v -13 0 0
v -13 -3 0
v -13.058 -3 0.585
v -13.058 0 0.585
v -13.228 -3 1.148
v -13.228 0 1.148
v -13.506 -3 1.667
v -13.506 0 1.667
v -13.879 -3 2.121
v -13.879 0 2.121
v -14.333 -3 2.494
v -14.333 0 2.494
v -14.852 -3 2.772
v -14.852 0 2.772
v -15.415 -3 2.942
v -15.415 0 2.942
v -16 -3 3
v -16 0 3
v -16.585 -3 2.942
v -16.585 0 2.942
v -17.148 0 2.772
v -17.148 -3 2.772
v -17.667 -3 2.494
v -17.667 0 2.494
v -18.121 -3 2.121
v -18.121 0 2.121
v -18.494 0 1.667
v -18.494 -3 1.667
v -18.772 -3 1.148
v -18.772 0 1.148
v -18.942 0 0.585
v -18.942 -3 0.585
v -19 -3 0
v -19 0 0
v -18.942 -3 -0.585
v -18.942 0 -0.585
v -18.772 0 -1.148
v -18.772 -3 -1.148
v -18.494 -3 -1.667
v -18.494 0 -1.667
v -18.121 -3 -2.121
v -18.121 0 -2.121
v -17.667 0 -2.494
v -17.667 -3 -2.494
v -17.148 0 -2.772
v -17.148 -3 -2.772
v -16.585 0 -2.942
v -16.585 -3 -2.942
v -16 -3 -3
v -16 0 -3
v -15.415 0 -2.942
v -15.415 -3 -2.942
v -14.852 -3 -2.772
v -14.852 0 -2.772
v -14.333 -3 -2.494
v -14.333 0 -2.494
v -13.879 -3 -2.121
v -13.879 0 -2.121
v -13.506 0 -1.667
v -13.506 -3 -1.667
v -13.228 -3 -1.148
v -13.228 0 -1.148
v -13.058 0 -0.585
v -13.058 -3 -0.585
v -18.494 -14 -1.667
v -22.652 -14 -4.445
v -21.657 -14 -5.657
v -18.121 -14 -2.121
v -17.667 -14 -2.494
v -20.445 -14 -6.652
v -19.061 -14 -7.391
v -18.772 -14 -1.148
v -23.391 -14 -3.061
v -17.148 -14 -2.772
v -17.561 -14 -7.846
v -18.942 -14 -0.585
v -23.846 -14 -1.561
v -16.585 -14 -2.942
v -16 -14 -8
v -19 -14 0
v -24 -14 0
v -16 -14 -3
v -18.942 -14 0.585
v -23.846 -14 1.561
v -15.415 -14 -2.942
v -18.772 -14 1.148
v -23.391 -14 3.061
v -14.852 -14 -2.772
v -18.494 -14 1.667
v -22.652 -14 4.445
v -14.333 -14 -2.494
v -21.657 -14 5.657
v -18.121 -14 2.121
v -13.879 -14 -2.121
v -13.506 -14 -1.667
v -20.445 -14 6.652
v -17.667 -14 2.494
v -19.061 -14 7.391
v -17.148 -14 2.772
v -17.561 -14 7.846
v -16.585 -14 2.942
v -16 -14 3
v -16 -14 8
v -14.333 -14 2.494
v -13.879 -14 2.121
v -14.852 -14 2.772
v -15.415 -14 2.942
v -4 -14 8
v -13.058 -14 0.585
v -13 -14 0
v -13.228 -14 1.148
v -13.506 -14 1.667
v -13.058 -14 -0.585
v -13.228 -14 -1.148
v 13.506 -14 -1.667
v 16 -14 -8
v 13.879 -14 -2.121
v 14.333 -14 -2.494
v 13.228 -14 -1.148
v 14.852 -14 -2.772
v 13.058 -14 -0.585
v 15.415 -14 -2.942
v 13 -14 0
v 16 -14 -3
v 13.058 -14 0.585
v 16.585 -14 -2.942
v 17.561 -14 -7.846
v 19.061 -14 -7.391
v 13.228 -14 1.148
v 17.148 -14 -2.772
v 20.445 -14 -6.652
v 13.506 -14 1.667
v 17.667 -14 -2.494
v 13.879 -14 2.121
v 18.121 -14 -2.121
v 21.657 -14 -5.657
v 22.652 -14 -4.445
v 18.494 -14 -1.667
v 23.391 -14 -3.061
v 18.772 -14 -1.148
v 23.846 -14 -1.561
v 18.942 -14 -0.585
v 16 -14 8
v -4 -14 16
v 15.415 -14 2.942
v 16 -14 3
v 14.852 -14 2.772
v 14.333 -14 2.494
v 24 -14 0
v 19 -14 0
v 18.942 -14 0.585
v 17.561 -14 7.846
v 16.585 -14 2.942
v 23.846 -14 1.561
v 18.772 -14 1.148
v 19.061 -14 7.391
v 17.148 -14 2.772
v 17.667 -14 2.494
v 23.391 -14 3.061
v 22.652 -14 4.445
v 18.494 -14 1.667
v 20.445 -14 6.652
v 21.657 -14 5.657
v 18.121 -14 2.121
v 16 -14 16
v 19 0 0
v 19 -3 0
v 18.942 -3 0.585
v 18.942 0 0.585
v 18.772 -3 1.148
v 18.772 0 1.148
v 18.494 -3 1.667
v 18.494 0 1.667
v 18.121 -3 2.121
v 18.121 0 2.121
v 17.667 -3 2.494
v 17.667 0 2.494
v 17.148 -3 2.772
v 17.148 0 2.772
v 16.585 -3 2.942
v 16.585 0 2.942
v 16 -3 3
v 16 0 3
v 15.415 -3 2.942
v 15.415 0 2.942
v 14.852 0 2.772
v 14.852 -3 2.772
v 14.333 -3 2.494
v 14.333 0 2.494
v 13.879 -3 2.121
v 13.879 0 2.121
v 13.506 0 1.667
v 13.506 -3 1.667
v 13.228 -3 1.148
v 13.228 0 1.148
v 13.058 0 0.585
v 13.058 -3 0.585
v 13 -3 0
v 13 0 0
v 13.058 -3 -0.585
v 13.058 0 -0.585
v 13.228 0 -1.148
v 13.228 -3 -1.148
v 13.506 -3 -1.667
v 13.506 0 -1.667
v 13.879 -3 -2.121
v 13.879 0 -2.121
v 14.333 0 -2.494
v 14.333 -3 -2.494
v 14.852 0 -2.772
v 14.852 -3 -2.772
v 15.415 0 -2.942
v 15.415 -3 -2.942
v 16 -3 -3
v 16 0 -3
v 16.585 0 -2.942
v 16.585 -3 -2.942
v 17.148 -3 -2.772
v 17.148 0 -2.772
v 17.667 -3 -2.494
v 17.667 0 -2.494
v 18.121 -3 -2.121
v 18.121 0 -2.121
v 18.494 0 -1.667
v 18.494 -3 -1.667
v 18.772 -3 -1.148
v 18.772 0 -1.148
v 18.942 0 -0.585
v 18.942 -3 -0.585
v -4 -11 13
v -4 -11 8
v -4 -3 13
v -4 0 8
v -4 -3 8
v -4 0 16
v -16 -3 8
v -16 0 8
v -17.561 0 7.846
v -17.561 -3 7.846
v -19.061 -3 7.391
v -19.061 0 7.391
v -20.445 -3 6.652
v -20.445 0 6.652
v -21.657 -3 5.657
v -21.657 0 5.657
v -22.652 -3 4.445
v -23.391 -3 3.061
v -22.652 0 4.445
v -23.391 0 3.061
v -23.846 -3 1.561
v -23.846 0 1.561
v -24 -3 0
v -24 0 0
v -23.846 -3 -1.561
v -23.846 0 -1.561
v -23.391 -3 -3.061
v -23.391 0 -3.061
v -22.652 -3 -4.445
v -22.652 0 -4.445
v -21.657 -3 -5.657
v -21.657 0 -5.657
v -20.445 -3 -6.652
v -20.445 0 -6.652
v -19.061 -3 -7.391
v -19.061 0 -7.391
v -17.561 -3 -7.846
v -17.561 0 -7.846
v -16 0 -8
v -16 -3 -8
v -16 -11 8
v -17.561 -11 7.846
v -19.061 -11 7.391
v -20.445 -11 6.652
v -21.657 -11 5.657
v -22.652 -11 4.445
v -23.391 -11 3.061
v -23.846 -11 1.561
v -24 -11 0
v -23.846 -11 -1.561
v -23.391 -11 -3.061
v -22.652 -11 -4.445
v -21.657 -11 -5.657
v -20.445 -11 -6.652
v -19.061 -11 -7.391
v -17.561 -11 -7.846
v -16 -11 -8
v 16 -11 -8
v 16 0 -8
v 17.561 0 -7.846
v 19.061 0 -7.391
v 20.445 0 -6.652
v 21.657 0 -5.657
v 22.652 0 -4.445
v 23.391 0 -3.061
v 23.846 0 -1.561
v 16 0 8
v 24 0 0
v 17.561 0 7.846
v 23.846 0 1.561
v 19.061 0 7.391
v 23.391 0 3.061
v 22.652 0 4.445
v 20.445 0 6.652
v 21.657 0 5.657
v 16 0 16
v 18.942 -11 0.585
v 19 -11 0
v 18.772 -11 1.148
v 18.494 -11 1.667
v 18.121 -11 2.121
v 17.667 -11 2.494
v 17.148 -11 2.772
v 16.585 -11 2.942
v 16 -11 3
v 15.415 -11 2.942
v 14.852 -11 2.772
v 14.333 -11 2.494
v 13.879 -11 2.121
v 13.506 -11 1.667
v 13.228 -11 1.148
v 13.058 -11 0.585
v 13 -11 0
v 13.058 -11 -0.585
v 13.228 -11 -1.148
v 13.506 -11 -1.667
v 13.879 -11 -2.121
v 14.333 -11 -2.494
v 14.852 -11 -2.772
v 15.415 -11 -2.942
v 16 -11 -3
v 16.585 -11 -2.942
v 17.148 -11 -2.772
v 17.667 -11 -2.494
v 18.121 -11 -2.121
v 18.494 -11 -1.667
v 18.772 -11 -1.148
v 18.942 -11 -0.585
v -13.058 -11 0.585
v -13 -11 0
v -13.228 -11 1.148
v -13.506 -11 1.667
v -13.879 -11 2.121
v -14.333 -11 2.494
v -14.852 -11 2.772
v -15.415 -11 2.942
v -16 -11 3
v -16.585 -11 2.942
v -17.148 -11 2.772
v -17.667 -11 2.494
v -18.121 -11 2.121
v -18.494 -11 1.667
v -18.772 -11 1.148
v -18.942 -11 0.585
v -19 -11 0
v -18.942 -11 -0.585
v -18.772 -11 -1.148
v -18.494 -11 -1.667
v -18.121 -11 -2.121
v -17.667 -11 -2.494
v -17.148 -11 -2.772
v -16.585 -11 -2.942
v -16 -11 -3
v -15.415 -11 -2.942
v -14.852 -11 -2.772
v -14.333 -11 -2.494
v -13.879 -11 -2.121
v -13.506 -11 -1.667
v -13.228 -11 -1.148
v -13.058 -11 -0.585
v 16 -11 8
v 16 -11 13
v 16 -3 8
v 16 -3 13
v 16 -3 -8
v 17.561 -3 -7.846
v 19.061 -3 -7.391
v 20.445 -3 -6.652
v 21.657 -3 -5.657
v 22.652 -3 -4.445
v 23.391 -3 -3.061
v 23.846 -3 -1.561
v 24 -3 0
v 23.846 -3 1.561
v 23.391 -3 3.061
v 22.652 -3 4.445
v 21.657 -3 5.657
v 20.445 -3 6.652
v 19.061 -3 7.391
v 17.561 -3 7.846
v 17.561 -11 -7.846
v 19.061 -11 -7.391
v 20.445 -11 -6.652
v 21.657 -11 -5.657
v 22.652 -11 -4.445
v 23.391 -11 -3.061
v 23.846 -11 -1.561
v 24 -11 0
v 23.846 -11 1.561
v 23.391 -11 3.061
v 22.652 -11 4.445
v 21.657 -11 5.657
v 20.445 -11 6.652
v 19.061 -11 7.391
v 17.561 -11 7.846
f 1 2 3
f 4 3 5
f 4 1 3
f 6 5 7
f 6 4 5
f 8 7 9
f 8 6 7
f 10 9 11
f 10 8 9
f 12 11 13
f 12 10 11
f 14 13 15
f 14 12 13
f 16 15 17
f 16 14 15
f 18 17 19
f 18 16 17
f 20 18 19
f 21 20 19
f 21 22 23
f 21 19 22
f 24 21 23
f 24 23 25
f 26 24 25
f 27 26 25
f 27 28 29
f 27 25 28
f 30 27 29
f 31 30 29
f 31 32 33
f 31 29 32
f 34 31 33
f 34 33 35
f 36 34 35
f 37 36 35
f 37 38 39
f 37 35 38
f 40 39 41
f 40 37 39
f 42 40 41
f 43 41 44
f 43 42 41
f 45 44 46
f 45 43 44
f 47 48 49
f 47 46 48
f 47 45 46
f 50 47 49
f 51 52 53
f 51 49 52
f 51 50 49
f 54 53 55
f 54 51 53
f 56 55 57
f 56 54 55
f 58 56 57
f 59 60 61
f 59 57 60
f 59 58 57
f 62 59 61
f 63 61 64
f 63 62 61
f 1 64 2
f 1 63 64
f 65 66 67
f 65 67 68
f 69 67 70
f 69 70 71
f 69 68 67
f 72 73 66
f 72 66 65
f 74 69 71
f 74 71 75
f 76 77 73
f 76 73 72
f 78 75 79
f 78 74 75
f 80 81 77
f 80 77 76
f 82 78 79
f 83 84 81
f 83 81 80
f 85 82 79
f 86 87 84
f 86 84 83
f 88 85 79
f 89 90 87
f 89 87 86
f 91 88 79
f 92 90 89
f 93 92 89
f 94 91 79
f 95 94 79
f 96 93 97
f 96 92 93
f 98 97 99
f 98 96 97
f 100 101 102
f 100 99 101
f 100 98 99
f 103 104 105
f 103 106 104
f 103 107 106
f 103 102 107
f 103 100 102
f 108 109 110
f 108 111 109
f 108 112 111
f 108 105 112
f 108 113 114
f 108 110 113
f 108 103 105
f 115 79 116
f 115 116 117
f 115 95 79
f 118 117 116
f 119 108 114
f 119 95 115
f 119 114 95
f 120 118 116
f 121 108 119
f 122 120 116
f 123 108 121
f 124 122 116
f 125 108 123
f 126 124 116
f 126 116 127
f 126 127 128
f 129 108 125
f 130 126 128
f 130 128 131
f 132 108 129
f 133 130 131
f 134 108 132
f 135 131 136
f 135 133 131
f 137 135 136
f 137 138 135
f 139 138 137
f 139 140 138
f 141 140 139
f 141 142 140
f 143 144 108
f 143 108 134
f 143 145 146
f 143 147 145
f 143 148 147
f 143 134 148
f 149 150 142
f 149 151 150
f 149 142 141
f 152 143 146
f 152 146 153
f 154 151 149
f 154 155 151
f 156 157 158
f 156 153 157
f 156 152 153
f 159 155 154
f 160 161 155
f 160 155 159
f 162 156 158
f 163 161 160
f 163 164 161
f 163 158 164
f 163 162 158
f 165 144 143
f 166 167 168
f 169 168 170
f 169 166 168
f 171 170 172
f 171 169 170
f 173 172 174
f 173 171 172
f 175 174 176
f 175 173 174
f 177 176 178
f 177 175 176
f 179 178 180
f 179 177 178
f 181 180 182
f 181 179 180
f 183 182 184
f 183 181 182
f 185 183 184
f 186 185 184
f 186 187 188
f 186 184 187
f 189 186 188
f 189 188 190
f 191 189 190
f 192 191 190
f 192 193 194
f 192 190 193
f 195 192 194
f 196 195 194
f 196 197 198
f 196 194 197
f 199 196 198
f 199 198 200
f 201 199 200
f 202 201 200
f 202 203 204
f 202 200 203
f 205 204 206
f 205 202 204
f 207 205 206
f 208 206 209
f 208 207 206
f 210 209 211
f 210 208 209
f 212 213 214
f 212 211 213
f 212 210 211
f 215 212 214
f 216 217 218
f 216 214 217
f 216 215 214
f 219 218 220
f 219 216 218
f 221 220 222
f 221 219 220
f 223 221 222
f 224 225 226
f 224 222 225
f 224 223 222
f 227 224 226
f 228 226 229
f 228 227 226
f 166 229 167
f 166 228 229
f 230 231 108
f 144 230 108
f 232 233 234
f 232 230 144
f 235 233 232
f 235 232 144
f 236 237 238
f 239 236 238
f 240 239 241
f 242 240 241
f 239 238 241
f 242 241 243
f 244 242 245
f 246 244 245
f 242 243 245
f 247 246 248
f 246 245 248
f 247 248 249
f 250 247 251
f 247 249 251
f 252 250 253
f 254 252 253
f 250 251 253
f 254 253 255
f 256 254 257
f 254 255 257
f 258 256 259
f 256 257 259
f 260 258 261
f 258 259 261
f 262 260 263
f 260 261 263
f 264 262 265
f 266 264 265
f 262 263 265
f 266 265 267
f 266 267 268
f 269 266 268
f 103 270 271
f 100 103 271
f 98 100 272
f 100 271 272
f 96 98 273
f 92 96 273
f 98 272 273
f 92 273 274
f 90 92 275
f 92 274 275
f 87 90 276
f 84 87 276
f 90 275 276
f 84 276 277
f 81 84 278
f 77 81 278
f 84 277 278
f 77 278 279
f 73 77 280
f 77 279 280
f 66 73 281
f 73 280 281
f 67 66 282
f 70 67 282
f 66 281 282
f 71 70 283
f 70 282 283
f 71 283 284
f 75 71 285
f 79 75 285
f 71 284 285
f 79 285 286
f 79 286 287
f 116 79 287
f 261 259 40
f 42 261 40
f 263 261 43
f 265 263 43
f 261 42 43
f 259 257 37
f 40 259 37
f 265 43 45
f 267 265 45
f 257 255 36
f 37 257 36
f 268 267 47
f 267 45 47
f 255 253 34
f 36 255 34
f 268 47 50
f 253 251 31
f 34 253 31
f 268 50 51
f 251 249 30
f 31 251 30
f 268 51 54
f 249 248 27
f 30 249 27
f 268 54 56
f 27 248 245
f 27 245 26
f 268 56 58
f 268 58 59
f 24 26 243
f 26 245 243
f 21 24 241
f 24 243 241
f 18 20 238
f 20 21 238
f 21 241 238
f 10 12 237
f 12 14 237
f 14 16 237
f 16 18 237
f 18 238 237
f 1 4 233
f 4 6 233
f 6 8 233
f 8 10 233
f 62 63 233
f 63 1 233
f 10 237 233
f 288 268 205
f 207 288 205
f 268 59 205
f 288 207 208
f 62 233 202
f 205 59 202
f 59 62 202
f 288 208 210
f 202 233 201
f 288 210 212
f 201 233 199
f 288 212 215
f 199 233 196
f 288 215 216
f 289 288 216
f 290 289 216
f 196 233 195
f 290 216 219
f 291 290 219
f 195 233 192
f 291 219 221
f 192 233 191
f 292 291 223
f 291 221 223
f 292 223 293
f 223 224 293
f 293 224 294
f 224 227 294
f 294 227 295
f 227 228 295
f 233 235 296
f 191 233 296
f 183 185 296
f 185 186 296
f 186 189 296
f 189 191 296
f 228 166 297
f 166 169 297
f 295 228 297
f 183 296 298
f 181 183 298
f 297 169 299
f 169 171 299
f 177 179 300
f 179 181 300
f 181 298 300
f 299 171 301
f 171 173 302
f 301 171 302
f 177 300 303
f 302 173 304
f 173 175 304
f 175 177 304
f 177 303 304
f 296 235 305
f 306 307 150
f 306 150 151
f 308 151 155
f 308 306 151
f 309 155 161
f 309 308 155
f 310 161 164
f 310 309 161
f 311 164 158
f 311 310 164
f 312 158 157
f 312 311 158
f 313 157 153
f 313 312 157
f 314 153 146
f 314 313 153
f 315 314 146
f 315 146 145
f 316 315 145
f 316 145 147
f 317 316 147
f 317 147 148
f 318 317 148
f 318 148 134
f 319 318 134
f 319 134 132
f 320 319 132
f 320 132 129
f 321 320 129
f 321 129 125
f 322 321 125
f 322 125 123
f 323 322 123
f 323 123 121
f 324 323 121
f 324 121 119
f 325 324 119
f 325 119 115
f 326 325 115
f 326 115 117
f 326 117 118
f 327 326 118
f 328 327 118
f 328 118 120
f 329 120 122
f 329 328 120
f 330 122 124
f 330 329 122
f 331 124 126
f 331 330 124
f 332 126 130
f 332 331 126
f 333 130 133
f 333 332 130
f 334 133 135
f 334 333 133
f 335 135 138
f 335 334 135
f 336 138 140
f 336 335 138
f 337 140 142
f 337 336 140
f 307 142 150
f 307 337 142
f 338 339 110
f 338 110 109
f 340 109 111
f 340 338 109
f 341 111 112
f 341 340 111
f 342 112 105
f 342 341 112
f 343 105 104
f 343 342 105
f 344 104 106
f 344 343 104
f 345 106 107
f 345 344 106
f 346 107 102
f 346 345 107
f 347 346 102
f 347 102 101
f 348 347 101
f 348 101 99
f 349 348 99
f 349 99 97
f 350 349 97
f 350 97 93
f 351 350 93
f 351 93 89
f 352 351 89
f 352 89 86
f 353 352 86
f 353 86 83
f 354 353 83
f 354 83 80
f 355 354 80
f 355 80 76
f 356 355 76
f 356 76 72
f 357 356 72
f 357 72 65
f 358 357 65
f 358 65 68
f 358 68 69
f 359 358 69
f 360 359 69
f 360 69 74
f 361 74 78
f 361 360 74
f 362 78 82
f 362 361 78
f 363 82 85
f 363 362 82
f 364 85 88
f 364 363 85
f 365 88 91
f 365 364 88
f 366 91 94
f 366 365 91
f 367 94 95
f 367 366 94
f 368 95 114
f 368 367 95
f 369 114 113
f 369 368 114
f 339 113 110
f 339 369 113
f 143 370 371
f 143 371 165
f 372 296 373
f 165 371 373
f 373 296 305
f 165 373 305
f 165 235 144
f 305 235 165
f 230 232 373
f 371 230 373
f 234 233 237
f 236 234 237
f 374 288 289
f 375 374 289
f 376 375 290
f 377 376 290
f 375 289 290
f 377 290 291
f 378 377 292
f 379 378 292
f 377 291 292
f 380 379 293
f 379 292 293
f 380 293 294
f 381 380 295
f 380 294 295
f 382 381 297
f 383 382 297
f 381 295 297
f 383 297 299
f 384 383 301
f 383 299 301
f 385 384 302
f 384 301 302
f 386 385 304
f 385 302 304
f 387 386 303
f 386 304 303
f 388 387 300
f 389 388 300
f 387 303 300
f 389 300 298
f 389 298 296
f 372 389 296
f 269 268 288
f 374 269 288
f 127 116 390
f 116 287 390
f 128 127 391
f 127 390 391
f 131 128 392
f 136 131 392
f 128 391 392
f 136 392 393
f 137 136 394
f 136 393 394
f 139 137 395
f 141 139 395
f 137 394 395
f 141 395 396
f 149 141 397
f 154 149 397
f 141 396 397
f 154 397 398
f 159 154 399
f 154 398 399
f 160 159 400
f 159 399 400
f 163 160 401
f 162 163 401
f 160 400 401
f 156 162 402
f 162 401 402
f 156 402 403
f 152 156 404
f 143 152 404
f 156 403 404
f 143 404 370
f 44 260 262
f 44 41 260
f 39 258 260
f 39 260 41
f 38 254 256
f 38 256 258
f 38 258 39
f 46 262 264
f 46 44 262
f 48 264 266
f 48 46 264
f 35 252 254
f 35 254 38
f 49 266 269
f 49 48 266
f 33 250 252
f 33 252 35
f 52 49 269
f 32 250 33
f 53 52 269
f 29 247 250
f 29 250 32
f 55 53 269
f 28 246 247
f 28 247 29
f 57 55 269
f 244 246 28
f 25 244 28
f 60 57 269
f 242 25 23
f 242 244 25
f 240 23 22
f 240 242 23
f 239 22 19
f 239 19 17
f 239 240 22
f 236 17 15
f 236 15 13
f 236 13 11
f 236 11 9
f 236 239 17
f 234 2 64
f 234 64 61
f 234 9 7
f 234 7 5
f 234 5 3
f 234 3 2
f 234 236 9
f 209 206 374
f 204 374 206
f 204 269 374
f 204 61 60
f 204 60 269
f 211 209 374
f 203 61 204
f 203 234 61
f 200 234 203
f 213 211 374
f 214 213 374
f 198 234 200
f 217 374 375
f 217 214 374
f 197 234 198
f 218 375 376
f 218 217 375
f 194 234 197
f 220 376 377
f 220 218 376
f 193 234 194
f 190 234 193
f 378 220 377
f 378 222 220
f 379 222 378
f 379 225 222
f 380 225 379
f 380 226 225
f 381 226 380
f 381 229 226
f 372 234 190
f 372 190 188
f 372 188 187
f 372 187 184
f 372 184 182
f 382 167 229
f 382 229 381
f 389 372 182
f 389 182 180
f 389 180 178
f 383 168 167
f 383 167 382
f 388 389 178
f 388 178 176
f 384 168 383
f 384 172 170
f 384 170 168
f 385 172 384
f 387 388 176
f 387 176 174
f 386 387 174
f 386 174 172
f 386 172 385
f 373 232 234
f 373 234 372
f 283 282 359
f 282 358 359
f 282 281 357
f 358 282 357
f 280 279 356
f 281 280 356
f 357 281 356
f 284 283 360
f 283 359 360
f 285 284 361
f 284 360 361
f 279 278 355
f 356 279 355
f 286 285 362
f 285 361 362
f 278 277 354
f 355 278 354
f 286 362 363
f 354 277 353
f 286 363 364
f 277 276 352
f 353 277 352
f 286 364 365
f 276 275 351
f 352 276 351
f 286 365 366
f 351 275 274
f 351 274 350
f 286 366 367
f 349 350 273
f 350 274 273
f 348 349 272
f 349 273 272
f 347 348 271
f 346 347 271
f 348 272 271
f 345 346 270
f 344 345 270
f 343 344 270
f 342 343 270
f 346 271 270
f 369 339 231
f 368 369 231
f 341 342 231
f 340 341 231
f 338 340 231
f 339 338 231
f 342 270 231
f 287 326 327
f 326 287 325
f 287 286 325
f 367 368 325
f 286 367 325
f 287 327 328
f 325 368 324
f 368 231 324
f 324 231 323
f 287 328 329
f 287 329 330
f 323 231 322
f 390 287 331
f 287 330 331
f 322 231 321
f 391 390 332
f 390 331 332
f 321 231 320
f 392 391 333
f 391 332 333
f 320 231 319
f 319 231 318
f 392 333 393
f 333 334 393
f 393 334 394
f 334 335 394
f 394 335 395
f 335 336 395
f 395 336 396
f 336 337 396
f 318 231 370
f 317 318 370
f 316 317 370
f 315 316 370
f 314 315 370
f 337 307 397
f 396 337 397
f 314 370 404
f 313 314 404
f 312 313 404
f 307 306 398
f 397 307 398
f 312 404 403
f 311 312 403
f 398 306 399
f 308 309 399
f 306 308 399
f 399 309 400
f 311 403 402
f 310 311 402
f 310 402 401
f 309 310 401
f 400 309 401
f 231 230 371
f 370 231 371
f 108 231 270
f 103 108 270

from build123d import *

# Parameters (mm, degrees)
F0_R     = 3
F0_W     = 20
F0_H     = 8
F1_DEPTH = 14
F2_T     = -3
F3_DEPTH = 14


with BuildPart() as f1:
    # F0 (on Front) → F1 (new body)
    with BuildSketch(Plane.XZ):
        with BuildLine():
            Line((-4, 8), (-16, 8))
            ThreePointArc((-16, 8), (-24, 0), (-16, -8))
            Line((-16, -8), (16, -8))
            ThreePointArc((16, -8), (24, 0), (16, 8))
            Line((16, 8), (-4, 8))
        make_face()
        with Locations((-16, 0)):
            Circle(F0_R, mode=Mode.SUBTRACT)
        with Locations((16, 0)):
            Circle(F0_R, mode=Mode.SUBTRACT)
        with Locations((6, 12)):
            Rectangle(F0_W, F0_H)
        with Locations((-16, 0)):
            Circle(F0_R)
        with Locations((16, 0)):
            Circle(F0_R)
    extrude(amount=F1_DEPTH)

    # F2
    f2_openings = [f1.faces().sort_by_distance(p)[0] for p in [
        (-4, -7, 12),
        (-10, -7, 8),
        (-24, -7, 0),
        (0, -7, -8),
        (24, -7, 0),
        (16, -7, 12),
    ]]
    offset(amount=F2_T, openings=f2_openings)

    # F0 (on Front) → F3 (cut)
    with BuildSketch(Plane.XZ):
        with Locations((16, 0)):
            Circle(F0_R)
        with Locations((-16, 0)):
            Circle(F0_R)
    extrude(amount=F3_DEPTH, mode=Mode.SUBTRACT)


solid = f1.part
